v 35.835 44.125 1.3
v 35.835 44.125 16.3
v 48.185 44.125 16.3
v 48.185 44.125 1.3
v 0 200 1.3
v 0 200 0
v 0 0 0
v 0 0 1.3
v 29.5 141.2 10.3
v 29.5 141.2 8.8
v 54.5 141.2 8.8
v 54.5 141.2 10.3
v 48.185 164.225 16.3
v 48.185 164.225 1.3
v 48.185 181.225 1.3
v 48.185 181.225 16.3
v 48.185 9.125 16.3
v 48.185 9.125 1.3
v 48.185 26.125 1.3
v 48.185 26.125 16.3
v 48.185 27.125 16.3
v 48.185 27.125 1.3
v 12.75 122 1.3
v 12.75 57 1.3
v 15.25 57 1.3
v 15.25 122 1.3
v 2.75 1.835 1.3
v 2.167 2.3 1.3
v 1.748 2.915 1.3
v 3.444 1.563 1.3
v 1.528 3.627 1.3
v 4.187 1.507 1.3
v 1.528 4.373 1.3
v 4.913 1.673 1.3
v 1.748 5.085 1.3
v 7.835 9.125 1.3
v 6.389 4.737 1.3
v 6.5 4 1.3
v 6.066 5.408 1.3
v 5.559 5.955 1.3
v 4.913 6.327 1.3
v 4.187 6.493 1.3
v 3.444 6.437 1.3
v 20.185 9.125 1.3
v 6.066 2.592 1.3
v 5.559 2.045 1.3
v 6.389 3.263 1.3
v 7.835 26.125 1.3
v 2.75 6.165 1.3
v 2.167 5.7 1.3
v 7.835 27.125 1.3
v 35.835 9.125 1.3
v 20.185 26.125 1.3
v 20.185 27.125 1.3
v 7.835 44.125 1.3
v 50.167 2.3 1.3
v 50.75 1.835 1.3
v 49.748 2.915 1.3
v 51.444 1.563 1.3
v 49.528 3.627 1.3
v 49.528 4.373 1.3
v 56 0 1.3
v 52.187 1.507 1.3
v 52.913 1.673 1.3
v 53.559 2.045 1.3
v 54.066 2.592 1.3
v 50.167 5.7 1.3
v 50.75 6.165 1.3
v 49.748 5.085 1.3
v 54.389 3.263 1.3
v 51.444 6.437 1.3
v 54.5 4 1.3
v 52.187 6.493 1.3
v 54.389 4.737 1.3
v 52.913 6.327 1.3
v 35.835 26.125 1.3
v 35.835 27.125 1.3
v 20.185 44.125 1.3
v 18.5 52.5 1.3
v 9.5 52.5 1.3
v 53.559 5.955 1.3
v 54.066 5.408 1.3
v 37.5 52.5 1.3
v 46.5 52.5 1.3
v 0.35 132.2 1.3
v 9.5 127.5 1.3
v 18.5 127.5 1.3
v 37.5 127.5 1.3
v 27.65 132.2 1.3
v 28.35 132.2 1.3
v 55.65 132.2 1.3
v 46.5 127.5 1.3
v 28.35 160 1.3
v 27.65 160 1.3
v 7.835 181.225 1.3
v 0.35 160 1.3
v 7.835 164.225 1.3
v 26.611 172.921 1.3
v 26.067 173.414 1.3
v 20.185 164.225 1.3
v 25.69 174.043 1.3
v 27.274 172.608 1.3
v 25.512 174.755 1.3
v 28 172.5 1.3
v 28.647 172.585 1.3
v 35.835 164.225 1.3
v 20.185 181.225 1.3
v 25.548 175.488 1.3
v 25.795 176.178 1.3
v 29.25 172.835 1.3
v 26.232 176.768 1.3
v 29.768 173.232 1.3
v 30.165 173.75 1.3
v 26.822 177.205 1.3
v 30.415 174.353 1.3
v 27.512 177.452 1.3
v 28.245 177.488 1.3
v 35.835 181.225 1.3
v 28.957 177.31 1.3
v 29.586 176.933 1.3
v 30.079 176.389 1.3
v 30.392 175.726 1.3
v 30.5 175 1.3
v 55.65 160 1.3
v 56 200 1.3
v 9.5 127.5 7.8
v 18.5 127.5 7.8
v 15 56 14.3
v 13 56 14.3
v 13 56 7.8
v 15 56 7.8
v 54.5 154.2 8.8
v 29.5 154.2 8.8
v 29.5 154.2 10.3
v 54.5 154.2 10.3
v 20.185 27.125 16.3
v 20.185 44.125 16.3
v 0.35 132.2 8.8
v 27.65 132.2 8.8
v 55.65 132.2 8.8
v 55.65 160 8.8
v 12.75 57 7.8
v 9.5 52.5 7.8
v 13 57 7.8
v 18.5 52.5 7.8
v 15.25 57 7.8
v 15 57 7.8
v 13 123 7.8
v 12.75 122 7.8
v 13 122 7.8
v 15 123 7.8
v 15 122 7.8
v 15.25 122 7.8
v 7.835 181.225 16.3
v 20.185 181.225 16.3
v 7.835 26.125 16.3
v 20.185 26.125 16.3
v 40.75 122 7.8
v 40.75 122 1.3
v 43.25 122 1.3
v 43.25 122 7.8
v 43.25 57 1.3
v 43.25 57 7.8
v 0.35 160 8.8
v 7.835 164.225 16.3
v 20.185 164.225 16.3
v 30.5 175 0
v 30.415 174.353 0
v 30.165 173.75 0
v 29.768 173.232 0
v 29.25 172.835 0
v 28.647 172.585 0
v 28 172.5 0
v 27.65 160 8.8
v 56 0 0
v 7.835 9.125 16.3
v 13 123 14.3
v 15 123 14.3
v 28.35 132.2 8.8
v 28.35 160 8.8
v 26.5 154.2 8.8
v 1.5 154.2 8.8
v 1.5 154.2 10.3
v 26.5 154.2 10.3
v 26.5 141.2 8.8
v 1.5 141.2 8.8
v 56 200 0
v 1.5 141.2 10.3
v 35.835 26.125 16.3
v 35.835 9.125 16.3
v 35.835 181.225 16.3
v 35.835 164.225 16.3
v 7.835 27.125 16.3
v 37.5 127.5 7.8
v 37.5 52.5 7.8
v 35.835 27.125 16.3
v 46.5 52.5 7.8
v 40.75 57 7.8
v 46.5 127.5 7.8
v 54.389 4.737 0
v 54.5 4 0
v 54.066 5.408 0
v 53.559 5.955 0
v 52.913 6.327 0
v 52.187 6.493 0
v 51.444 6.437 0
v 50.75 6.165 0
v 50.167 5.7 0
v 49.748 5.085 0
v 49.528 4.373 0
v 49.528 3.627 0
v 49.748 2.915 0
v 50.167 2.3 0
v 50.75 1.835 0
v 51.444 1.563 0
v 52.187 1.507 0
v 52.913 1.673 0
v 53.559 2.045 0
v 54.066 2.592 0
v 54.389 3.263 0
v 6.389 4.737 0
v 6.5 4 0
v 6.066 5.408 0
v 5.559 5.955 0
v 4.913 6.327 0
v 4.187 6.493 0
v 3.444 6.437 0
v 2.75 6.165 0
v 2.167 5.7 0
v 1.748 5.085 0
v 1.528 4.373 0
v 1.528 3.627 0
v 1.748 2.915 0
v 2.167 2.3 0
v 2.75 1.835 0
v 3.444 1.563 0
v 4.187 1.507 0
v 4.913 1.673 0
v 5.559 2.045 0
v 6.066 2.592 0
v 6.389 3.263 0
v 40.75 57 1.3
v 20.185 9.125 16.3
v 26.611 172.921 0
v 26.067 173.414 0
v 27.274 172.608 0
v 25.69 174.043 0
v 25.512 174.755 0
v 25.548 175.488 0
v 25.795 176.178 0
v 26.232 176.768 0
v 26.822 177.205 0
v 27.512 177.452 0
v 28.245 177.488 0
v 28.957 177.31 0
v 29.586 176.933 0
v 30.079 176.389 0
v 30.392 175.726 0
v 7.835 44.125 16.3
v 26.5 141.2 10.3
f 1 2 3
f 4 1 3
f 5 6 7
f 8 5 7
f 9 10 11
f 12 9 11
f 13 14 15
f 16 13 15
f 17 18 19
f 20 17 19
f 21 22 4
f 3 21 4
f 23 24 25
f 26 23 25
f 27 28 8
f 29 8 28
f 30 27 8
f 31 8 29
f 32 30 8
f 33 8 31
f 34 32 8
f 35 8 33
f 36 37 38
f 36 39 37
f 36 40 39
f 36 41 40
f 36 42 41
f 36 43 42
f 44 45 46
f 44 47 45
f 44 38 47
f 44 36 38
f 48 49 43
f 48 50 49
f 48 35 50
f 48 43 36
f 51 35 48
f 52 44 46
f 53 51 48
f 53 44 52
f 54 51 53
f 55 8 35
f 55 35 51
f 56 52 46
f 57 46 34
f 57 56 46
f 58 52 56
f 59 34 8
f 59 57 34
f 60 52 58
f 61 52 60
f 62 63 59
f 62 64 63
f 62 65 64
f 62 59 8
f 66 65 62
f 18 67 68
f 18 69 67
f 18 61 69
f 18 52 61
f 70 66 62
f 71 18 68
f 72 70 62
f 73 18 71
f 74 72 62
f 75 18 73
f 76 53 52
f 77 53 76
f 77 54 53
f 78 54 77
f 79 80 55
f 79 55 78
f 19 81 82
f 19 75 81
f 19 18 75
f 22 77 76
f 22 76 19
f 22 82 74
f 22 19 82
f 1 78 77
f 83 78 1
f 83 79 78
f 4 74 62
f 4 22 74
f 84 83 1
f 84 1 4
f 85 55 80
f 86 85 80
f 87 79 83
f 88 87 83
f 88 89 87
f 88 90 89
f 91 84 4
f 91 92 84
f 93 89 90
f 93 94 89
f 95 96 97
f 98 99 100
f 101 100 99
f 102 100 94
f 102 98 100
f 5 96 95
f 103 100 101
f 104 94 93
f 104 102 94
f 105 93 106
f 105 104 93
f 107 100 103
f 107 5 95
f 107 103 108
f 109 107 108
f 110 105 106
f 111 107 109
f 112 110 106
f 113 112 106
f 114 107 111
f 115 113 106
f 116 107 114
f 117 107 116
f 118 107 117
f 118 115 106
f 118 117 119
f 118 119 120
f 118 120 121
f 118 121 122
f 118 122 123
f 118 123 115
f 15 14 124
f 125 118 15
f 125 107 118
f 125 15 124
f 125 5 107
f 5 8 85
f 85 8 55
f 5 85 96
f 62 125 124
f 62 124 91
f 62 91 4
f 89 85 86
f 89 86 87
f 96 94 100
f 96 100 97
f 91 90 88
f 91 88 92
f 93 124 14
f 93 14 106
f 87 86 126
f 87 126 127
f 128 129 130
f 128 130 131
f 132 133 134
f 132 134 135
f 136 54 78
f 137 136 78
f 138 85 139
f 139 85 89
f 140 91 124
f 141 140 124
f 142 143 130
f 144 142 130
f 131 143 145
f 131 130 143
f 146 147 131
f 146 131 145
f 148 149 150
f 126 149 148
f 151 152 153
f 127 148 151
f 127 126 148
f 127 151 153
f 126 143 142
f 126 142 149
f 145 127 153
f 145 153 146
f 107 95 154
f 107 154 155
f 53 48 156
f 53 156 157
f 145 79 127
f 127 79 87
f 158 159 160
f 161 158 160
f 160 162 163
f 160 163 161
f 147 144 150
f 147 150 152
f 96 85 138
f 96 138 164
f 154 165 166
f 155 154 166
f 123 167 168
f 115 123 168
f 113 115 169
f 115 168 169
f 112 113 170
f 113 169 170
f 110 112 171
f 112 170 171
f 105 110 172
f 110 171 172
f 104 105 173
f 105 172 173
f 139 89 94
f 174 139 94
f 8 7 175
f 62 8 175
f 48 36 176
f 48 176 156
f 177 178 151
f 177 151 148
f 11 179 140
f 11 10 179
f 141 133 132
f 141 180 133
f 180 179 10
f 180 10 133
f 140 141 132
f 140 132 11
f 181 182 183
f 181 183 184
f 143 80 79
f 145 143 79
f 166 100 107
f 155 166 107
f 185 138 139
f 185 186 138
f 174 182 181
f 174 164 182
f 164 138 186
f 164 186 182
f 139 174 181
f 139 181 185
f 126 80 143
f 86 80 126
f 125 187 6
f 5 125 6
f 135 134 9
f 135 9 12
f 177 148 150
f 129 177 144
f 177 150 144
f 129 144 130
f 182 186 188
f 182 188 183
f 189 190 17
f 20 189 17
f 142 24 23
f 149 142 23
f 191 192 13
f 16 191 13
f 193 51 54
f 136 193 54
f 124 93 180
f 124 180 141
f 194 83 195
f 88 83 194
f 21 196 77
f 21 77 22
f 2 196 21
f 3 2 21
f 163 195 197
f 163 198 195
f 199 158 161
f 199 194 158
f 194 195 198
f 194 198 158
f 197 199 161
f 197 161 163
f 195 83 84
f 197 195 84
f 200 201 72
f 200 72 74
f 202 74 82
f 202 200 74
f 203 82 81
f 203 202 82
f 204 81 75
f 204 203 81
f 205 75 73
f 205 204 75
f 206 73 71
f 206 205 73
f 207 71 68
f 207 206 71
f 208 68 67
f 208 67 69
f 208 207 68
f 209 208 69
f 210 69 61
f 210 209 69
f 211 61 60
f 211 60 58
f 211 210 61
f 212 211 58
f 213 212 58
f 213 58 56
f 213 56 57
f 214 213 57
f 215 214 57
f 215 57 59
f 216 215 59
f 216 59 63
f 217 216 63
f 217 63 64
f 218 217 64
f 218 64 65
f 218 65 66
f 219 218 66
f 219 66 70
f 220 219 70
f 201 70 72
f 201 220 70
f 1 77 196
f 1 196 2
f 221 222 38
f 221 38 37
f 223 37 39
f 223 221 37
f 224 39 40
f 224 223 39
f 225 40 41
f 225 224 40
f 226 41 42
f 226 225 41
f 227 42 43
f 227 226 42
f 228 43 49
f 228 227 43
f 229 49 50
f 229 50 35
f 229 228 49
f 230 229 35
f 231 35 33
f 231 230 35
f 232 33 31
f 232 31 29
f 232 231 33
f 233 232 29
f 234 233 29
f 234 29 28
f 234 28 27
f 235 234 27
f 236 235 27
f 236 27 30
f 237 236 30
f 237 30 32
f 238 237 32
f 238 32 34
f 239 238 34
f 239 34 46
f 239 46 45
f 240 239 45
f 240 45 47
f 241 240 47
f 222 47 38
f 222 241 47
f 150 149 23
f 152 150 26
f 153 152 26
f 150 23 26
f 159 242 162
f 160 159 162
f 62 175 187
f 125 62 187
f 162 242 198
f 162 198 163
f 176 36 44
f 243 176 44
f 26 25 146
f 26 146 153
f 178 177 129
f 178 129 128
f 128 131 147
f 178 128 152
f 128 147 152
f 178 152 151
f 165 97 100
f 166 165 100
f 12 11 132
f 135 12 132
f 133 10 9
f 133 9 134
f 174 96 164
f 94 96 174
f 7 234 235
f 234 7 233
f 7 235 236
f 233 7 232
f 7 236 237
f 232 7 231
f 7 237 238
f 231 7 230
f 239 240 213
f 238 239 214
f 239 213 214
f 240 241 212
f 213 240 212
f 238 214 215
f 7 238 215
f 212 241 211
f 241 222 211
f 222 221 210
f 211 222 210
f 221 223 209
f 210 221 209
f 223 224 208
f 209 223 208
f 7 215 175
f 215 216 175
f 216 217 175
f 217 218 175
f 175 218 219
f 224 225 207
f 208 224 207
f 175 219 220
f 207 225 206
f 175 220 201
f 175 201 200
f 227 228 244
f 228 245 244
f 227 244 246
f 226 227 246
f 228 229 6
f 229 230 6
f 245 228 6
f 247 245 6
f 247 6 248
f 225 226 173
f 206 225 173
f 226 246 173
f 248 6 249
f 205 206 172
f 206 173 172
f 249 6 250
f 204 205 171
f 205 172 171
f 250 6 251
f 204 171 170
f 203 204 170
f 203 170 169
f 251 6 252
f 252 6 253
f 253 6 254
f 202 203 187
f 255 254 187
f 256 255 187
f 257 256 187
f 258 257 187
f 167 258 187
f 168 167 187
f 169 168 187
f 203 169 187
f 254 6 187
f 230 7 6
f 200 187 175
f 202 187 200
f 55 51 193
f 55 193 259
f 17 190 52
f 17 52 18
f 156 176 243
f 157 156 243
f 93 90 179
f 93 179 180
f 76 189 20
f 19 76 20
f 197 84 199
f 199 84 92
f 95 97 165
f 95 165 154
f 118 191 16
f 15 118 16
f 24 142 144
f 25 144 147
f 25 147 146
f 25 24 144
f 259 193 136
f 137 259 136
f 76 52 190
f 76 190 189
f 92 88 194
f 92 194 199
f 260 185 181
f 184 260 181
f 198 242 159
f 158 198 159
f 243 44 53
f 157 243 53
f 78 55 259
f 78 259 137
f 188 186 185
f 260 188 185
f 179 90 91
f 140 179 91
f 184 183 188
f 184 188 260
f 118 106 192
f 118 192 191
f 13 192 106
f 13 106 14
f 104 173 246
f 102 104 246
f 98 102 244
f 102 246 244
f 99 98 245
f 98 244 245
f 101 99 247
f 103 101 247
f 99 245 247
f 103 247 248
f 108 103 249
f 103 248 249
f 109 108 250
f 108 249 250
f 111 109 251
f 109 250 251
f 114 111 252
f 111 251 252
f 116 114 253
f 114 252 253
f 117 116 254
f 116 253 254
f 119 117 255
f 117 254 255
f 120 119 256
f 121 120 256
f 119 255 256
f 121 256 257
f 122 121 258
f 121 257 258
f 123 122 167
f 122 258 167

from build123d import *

# Parameters (mm, degrees)
SKETCH1_R                = 2.5
SKETCH1_W                = 12.35
SKETCH1_H                = 17
BOSS_EXTRUDE1_DEPTH      = 1.3
BOSS_EXTRUDE2_DEPTH      = 15
BOSS_EXTRUDE2_DEPTH_BACK = 1.3
SKETCH2_W                = 12.35
SKETCH2_H                = 17
SKETCH3_W                = 27.3
SKETCH3_H                = 27.8
BOSS_EXTRUDE3_DEPTH      = 7.5
SKETCH4_W                = 25
SKETCH4_H                = 13
BOSS_EXTRUDE4_DEPTH      = 1.5
SKETCH5_W                = 9
SKETCH5_H                = 75
SKETCH5_W_2              = 2.5
SKETCH5_H_2              = 65
BOSS_EXTRUDE5_DEPTH      = 6.5
SKETCH7_W                = 1
SKETCH7_H                = 1
SKETCH7_H_2              = 65
BOSS_EXTRUDE6_DEPTH      = 6.5


with BuildPart() as part:
    # Sketch1 → Boss-Extrude1 (new body)
    with BuildSketch(Plane.XY):
        Polygon((0, 200), (0, 0), (3.731641176, 0), (10.2, 0), (28, 0), (38.2, 0), (56, 0), (56, 200), align=None)
        with Locations((4, 4)):
            Circle(SKETCH1_R, mode=Mode.SUBTRACT)
        Polygon((20.185, 9.125), (10.2, 9.125), (7.835, 9.125), (7.835, 26.125), (20.185, 26.125), align=None, mode=Mode.SUBTRACT)
        with Locations((14.01, 35.625)):
            Rectangle(SKETCH1_W, SKETCH1_H, mode=Mode.SUBTRACT)
        Polygon((48.185, 9.125), (38.2, 9.125), (35.835, 9.125), (35.835, 26.125), (48.185, 26.125), align=None, mode=Mode.SUBTRACT)
        with Locations((52, 4)):
            Circle(SKETCH1_R, mode=Mode.SUBTRACT)
        with Locations((42.01, 35.625)):
            Rectangle(SKETCH1_W, SKETCH1_H, mode=Mode.SUBTRACT)
        Polygon((20.185, 164.225), (10.2, 164.225), (7.835, 164.225), (7.835, 181.225), (20.185, 181.225), align=None, mode=Mode.SUBTRACT)
        with BuildLine():
            ThreePointArc((30.5, 175), (29.767766953, 173.232233047), (28, 172.5))
            ThreePointArc((28, 172.5), (26.232233047, 176.767766953), (30.5, 175))
        make_face(mode=Mode.SUBTRACT)
        Polygon((48.185, 164.225), (38.2, 164.225), (35.835, 164.225), (35.835, 181.225), (48.185, 181.225), align=None, mode=Mode.SUBTRACT)
    extrude(amount=BOSS_EXTRUDE1_DEPTH)

    # Sketch2 → Boss-Extrude2 (add, two sides: drawn at the far end of the back side and taken through both)
    with BuildSketch(Plane.XY.offset(1.3).offset(-BOSS_EXTRUDE2_DEPTH_BACK)):
        with Locations((14.01, 172.725)):
            Rectangle(SKETCH2_W, SKETCH2_H)
        with Locations((42.01, 172.725)):
            Rectangle(SKETCH2_W, SKETCH2_H)
        with Locations((42.01, 35.625)):
            Rectangle(SKETCH2_W, SKETCH2_H)
        with Locations((42.01, 17.625)):
            Rectangle(SKETCH2_W, SKETCH2_H)
        with Locations((14.01, 17.625)):
            Rectangle(SKETCH2_W, SKETCH2_H)
        with Locations((14.01, 35.625)):
            Rectangle(SKETCH2_W, SKETCH2_H)
    extrude(amount=BOSS_EXTRUDE2_DEPTH + BOSS_EXTRUDE2_DEPTH_BACK)

    # Sketch3 → Boss-Extrude3 (add)
    with BuildSketch(Plane.XY.offset(1.3)):
        with Locations((14, 146.1)):
            Rectangle(SKETCH3_W, SKETCH3_H)
        with Locations((42, 146.1)):
            Rectangle(SKETCH3_W, SKETCH3_H)
    extrude(amount=BOSS_EXTRUDE3_DEPTH)

    # Sketch4 → Boss-Extrude4 (add)
    with BuildSketch(Plane.XY.offset(8.8)):
        with Locations((14, 147.7)):
            Rectangle(SKETCH4_W, SKETCH4_H)
        with Locations((42, 147.7)):
            Rectangle(SKETCH4_W, SKETCH4_H)
    extrude(amount=BOSS_EXTRUDE4_DEPTH)

    # Sketch5 → Boss-Extrude5 (add)
    # profile 1 of 2: a face of its own
    with BuildSketch(Plane.XY.offset(1.3)):
        with Locations((14, 90)):
            Rectangle(SKETCH5_W, SKETCH5_H)
        with Locations((14, 89.5)):
            Rectangle(SKETCH5_W_2, SKETCH5_H_2, mode=Mode.SUBTRACT)
    # profile 2 of 2: a face of its own
    with BuildSketch(Plane.XY.offset(1.3)):
        with Locations((42, 90)):
            Rectangle(SKETCH5_W, SKETCH5_H)
        with Locations((42, 89.5)):
            Rectangle(SKETCH5_W_2, SKETCH5_H_2, mode=Mode.SUBTRACT)
    extrude(amount=BOSS_EXTRUDE5_DEPTH)

    # Sketch7 → Boss-Extrude6 (add)
    with BuildSketch(Plane.XY.offset(7.8)):
        with Locations((13.5, 122.5)):
            Rectangle(SKETCH7_W, SKETCH7_H)
        with Locations((14.5, 122.5)):
            Rectangle(SKETCH7_W, SKETCH7_H)
        with Locations((13.5, 89.5)):
            Rectangle(SKETCH7_W, SKETCH7_H_2)
        with Locations((14.5, 89.5)):
            Rectangle(SKETCH7_W, SKETCH7_H_2)
        with Locations((14.5, 56.5)):
            Rectangle(SKETCH7_W, SKETCH7_H)
        with Locations((13.5, 56.5)):
            Rectangle(SKETCH7_W, SKETCH7_H)
    extrude(amount=BOSS_EXTRUDE6_DEPTH)


solid = part.part
